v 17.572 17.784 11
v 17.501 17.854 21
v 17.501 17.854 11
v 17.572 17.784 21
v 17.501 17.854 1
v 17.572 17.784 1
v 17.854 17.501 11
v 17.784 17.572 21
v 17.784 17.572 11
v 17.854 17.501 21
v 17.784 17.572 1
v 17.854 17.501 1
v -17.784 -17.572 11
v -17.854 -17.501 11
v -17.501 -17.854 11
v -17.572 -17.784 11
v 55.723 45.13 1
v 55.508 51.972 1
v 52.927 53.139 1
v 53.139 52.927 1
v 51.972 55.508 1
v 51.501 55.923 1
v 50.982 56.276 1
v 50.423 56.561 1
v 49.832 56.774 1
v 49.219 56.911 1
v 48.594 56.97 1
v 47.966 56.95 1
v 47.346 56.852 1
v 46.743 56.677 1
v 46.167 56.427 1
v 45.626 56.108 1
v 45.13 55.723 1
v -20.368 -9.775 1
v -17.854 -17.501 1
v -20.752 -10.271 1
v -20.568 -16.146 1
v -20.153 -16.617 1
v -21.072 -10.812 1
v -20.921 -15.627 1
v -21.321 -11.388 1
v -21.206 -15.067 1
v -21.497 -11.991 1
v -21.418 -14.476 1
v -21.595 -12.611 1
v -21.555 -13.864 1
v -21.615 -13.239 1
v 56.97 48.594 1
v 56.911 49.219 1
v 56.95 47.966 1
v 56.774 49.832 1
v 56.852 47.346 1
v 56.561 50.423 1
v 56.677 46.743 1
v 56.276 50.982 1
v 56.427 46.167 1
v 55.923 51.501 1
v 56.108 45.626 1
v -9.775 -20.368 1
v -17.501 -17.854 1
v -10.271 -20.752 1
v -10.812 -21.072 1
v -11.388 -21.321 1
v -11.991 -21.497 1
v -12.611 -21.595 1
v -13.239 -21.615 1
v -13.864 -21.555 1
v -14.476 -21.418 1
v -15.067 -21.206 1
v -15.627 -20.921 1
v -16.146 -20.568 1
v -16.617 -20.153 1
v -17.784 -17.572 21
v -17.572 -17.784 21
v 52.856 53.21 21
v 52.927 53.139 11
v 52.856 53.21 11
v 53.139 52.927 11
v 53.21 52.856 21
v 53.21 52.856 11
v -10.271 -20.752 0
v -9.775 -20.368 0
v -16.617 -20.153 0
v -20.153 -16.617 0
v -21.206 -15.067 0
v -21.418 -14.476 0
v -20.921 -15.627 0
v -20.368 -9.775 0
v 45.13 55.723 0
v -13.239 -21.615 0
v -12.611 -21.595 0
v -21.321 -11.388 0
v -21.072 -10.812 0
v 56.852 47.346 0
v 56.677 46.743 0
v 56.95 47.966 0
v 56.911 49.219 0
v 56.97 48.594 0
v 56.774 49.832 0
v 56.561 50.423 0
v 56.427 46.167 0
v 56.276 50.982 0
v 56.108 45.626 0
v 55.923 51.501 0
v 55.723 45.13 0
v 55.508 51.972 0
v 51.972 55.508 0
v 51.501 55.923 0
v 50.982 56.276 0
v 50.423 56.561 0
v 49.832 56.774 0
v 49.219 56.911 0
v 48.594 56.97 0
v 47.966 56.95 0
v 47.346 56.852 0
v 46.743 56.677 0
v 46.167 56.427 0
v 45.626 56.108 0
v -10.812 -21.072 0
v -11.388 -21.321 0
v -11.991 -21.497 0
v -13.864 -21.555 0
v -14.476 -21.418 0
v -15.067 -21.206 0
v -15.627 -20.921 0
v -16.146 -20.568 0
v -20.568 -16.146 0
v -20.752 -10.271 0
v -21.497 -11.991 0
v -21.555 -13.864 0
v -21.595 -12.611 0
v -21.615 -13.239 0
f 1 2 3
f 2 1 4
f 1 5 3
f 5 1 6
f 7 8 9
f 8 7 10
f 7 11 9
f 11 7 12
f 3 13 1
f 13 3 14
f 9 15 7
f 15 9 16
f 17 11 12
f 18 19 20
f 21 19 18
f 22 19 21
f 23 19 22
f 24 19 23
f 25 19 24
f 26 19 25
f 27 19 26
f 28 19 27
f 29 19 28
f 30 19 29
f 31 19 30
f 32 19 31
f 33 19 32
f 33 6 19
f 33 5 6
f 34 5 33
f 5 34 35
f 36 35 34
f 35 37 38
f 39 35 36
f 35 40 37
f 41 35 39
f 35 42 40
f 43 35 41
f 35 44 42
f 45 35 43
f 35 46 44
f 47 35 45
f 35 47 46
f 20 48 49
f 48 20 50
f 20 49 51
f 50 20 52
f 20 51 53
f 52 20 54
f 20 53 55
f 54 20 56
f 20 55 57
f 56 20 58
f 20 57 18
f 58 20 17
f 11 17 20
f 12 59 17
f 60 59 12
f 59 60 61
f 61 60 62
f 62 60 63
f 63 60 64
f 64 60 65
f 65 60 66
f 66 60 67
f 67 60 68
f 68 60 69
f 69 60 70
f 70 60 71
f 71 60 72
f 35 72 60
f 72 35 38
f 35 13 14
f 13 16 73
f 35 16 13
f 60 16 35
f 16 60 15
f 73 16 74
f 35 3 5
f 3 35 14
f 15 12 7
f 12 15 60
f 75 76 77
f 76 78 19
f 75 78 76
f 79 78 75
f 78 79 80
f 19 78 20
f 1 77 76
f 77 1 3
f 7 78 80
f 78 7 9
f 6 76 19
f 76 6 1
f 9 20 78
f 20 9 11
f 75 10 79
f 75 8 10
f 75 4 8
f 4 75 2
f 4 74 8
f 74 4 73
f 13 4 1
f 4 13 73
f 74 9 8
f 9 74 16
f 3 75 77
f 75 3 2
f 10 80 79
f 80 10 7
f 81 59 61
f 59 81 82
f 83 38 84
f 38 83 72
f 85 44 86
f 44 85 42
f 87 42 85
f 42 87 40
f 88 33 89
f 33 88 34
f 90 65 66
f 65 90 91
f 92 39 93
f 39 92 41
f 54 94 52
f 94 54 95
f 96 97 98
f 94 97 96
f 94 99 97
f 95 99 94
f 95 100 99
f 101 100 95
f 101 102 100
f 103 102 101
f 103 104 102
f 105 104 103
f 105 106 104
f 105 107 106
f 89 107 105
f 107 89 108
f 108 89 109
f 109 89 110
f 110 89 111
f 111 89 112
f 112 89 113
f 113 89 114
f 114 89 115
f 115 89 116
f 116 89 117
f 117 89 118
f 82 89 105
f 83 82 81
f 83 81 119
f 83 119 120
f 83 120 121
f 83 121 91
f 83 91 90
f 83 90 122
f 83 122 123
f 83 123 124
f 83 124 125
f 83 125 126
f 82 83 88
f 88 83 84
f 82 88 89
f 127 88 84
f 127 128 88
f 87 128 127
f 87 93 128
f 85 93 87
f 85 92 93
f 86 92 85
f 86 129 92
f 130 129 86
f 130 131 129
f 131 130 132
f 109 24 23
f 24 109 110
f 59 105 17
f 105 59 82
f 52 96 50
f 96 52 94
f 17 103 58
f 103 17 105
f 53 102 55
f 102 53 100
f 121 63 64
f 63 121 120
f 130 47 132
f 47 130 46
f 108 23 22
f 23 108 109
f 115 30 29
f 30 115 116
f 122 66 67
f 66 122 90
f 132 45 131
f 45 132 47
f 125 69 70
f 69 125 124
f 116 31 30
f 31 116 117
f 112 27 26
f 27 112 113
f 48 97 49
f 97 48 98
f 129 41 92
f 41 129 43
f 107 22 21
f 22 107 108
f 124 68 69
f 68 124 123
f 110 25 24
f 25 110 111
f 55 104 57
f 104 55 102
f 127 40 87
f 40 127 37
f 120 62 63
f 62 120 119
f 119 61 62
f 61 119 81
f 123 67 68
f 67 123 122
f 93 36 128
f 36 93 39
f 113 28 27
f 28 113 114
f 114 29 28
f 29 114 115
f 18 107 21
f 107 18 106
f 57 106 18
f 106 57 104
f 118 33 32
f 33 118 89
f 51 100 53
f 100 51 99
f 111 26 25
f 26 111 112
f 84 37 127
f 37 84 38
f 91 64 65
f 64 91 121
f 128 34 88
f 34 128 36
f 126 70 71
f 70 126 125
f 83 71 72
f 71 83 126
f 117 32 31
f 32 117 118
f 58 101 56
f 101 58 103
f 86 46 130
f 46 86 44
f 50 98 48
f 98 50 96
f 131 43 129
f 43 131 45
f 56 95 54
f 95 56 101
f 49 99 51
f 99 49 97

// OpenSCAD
//--------------------------------------------------------------------------------------
// Flow Variation
//---------------------------
// Nozzle 0.4
//---------------------------
// Cura Arachne
//---------------------------
// Layer = 0.2 (First layer 0.2)
// Nozzle = 0.4
//--------------------------------------------------------------------------------------

$fn = 50;

Nozzle = 0.4;
Width1=1.25*Nozzle;
Width2=0.75*Nozzle;

rotate([0,0,45]) union() {
    union() {
    translate([0,0,6]) cube([50,Width1,10], center = true);
    translate([50,0,6]) cube([50,Width2,10], center = true);
    translate([0,0,16]) cube([50,Width2,10], center = true);
    translate([50,0,16]) cube([50,Width1,10], center = true);        
    }
    translate([25,0,0.25]) minkowski()
        {
          cube([92,5,0.5], center = true);
          cylinder(r=5,h=0.5);
        }
    }
